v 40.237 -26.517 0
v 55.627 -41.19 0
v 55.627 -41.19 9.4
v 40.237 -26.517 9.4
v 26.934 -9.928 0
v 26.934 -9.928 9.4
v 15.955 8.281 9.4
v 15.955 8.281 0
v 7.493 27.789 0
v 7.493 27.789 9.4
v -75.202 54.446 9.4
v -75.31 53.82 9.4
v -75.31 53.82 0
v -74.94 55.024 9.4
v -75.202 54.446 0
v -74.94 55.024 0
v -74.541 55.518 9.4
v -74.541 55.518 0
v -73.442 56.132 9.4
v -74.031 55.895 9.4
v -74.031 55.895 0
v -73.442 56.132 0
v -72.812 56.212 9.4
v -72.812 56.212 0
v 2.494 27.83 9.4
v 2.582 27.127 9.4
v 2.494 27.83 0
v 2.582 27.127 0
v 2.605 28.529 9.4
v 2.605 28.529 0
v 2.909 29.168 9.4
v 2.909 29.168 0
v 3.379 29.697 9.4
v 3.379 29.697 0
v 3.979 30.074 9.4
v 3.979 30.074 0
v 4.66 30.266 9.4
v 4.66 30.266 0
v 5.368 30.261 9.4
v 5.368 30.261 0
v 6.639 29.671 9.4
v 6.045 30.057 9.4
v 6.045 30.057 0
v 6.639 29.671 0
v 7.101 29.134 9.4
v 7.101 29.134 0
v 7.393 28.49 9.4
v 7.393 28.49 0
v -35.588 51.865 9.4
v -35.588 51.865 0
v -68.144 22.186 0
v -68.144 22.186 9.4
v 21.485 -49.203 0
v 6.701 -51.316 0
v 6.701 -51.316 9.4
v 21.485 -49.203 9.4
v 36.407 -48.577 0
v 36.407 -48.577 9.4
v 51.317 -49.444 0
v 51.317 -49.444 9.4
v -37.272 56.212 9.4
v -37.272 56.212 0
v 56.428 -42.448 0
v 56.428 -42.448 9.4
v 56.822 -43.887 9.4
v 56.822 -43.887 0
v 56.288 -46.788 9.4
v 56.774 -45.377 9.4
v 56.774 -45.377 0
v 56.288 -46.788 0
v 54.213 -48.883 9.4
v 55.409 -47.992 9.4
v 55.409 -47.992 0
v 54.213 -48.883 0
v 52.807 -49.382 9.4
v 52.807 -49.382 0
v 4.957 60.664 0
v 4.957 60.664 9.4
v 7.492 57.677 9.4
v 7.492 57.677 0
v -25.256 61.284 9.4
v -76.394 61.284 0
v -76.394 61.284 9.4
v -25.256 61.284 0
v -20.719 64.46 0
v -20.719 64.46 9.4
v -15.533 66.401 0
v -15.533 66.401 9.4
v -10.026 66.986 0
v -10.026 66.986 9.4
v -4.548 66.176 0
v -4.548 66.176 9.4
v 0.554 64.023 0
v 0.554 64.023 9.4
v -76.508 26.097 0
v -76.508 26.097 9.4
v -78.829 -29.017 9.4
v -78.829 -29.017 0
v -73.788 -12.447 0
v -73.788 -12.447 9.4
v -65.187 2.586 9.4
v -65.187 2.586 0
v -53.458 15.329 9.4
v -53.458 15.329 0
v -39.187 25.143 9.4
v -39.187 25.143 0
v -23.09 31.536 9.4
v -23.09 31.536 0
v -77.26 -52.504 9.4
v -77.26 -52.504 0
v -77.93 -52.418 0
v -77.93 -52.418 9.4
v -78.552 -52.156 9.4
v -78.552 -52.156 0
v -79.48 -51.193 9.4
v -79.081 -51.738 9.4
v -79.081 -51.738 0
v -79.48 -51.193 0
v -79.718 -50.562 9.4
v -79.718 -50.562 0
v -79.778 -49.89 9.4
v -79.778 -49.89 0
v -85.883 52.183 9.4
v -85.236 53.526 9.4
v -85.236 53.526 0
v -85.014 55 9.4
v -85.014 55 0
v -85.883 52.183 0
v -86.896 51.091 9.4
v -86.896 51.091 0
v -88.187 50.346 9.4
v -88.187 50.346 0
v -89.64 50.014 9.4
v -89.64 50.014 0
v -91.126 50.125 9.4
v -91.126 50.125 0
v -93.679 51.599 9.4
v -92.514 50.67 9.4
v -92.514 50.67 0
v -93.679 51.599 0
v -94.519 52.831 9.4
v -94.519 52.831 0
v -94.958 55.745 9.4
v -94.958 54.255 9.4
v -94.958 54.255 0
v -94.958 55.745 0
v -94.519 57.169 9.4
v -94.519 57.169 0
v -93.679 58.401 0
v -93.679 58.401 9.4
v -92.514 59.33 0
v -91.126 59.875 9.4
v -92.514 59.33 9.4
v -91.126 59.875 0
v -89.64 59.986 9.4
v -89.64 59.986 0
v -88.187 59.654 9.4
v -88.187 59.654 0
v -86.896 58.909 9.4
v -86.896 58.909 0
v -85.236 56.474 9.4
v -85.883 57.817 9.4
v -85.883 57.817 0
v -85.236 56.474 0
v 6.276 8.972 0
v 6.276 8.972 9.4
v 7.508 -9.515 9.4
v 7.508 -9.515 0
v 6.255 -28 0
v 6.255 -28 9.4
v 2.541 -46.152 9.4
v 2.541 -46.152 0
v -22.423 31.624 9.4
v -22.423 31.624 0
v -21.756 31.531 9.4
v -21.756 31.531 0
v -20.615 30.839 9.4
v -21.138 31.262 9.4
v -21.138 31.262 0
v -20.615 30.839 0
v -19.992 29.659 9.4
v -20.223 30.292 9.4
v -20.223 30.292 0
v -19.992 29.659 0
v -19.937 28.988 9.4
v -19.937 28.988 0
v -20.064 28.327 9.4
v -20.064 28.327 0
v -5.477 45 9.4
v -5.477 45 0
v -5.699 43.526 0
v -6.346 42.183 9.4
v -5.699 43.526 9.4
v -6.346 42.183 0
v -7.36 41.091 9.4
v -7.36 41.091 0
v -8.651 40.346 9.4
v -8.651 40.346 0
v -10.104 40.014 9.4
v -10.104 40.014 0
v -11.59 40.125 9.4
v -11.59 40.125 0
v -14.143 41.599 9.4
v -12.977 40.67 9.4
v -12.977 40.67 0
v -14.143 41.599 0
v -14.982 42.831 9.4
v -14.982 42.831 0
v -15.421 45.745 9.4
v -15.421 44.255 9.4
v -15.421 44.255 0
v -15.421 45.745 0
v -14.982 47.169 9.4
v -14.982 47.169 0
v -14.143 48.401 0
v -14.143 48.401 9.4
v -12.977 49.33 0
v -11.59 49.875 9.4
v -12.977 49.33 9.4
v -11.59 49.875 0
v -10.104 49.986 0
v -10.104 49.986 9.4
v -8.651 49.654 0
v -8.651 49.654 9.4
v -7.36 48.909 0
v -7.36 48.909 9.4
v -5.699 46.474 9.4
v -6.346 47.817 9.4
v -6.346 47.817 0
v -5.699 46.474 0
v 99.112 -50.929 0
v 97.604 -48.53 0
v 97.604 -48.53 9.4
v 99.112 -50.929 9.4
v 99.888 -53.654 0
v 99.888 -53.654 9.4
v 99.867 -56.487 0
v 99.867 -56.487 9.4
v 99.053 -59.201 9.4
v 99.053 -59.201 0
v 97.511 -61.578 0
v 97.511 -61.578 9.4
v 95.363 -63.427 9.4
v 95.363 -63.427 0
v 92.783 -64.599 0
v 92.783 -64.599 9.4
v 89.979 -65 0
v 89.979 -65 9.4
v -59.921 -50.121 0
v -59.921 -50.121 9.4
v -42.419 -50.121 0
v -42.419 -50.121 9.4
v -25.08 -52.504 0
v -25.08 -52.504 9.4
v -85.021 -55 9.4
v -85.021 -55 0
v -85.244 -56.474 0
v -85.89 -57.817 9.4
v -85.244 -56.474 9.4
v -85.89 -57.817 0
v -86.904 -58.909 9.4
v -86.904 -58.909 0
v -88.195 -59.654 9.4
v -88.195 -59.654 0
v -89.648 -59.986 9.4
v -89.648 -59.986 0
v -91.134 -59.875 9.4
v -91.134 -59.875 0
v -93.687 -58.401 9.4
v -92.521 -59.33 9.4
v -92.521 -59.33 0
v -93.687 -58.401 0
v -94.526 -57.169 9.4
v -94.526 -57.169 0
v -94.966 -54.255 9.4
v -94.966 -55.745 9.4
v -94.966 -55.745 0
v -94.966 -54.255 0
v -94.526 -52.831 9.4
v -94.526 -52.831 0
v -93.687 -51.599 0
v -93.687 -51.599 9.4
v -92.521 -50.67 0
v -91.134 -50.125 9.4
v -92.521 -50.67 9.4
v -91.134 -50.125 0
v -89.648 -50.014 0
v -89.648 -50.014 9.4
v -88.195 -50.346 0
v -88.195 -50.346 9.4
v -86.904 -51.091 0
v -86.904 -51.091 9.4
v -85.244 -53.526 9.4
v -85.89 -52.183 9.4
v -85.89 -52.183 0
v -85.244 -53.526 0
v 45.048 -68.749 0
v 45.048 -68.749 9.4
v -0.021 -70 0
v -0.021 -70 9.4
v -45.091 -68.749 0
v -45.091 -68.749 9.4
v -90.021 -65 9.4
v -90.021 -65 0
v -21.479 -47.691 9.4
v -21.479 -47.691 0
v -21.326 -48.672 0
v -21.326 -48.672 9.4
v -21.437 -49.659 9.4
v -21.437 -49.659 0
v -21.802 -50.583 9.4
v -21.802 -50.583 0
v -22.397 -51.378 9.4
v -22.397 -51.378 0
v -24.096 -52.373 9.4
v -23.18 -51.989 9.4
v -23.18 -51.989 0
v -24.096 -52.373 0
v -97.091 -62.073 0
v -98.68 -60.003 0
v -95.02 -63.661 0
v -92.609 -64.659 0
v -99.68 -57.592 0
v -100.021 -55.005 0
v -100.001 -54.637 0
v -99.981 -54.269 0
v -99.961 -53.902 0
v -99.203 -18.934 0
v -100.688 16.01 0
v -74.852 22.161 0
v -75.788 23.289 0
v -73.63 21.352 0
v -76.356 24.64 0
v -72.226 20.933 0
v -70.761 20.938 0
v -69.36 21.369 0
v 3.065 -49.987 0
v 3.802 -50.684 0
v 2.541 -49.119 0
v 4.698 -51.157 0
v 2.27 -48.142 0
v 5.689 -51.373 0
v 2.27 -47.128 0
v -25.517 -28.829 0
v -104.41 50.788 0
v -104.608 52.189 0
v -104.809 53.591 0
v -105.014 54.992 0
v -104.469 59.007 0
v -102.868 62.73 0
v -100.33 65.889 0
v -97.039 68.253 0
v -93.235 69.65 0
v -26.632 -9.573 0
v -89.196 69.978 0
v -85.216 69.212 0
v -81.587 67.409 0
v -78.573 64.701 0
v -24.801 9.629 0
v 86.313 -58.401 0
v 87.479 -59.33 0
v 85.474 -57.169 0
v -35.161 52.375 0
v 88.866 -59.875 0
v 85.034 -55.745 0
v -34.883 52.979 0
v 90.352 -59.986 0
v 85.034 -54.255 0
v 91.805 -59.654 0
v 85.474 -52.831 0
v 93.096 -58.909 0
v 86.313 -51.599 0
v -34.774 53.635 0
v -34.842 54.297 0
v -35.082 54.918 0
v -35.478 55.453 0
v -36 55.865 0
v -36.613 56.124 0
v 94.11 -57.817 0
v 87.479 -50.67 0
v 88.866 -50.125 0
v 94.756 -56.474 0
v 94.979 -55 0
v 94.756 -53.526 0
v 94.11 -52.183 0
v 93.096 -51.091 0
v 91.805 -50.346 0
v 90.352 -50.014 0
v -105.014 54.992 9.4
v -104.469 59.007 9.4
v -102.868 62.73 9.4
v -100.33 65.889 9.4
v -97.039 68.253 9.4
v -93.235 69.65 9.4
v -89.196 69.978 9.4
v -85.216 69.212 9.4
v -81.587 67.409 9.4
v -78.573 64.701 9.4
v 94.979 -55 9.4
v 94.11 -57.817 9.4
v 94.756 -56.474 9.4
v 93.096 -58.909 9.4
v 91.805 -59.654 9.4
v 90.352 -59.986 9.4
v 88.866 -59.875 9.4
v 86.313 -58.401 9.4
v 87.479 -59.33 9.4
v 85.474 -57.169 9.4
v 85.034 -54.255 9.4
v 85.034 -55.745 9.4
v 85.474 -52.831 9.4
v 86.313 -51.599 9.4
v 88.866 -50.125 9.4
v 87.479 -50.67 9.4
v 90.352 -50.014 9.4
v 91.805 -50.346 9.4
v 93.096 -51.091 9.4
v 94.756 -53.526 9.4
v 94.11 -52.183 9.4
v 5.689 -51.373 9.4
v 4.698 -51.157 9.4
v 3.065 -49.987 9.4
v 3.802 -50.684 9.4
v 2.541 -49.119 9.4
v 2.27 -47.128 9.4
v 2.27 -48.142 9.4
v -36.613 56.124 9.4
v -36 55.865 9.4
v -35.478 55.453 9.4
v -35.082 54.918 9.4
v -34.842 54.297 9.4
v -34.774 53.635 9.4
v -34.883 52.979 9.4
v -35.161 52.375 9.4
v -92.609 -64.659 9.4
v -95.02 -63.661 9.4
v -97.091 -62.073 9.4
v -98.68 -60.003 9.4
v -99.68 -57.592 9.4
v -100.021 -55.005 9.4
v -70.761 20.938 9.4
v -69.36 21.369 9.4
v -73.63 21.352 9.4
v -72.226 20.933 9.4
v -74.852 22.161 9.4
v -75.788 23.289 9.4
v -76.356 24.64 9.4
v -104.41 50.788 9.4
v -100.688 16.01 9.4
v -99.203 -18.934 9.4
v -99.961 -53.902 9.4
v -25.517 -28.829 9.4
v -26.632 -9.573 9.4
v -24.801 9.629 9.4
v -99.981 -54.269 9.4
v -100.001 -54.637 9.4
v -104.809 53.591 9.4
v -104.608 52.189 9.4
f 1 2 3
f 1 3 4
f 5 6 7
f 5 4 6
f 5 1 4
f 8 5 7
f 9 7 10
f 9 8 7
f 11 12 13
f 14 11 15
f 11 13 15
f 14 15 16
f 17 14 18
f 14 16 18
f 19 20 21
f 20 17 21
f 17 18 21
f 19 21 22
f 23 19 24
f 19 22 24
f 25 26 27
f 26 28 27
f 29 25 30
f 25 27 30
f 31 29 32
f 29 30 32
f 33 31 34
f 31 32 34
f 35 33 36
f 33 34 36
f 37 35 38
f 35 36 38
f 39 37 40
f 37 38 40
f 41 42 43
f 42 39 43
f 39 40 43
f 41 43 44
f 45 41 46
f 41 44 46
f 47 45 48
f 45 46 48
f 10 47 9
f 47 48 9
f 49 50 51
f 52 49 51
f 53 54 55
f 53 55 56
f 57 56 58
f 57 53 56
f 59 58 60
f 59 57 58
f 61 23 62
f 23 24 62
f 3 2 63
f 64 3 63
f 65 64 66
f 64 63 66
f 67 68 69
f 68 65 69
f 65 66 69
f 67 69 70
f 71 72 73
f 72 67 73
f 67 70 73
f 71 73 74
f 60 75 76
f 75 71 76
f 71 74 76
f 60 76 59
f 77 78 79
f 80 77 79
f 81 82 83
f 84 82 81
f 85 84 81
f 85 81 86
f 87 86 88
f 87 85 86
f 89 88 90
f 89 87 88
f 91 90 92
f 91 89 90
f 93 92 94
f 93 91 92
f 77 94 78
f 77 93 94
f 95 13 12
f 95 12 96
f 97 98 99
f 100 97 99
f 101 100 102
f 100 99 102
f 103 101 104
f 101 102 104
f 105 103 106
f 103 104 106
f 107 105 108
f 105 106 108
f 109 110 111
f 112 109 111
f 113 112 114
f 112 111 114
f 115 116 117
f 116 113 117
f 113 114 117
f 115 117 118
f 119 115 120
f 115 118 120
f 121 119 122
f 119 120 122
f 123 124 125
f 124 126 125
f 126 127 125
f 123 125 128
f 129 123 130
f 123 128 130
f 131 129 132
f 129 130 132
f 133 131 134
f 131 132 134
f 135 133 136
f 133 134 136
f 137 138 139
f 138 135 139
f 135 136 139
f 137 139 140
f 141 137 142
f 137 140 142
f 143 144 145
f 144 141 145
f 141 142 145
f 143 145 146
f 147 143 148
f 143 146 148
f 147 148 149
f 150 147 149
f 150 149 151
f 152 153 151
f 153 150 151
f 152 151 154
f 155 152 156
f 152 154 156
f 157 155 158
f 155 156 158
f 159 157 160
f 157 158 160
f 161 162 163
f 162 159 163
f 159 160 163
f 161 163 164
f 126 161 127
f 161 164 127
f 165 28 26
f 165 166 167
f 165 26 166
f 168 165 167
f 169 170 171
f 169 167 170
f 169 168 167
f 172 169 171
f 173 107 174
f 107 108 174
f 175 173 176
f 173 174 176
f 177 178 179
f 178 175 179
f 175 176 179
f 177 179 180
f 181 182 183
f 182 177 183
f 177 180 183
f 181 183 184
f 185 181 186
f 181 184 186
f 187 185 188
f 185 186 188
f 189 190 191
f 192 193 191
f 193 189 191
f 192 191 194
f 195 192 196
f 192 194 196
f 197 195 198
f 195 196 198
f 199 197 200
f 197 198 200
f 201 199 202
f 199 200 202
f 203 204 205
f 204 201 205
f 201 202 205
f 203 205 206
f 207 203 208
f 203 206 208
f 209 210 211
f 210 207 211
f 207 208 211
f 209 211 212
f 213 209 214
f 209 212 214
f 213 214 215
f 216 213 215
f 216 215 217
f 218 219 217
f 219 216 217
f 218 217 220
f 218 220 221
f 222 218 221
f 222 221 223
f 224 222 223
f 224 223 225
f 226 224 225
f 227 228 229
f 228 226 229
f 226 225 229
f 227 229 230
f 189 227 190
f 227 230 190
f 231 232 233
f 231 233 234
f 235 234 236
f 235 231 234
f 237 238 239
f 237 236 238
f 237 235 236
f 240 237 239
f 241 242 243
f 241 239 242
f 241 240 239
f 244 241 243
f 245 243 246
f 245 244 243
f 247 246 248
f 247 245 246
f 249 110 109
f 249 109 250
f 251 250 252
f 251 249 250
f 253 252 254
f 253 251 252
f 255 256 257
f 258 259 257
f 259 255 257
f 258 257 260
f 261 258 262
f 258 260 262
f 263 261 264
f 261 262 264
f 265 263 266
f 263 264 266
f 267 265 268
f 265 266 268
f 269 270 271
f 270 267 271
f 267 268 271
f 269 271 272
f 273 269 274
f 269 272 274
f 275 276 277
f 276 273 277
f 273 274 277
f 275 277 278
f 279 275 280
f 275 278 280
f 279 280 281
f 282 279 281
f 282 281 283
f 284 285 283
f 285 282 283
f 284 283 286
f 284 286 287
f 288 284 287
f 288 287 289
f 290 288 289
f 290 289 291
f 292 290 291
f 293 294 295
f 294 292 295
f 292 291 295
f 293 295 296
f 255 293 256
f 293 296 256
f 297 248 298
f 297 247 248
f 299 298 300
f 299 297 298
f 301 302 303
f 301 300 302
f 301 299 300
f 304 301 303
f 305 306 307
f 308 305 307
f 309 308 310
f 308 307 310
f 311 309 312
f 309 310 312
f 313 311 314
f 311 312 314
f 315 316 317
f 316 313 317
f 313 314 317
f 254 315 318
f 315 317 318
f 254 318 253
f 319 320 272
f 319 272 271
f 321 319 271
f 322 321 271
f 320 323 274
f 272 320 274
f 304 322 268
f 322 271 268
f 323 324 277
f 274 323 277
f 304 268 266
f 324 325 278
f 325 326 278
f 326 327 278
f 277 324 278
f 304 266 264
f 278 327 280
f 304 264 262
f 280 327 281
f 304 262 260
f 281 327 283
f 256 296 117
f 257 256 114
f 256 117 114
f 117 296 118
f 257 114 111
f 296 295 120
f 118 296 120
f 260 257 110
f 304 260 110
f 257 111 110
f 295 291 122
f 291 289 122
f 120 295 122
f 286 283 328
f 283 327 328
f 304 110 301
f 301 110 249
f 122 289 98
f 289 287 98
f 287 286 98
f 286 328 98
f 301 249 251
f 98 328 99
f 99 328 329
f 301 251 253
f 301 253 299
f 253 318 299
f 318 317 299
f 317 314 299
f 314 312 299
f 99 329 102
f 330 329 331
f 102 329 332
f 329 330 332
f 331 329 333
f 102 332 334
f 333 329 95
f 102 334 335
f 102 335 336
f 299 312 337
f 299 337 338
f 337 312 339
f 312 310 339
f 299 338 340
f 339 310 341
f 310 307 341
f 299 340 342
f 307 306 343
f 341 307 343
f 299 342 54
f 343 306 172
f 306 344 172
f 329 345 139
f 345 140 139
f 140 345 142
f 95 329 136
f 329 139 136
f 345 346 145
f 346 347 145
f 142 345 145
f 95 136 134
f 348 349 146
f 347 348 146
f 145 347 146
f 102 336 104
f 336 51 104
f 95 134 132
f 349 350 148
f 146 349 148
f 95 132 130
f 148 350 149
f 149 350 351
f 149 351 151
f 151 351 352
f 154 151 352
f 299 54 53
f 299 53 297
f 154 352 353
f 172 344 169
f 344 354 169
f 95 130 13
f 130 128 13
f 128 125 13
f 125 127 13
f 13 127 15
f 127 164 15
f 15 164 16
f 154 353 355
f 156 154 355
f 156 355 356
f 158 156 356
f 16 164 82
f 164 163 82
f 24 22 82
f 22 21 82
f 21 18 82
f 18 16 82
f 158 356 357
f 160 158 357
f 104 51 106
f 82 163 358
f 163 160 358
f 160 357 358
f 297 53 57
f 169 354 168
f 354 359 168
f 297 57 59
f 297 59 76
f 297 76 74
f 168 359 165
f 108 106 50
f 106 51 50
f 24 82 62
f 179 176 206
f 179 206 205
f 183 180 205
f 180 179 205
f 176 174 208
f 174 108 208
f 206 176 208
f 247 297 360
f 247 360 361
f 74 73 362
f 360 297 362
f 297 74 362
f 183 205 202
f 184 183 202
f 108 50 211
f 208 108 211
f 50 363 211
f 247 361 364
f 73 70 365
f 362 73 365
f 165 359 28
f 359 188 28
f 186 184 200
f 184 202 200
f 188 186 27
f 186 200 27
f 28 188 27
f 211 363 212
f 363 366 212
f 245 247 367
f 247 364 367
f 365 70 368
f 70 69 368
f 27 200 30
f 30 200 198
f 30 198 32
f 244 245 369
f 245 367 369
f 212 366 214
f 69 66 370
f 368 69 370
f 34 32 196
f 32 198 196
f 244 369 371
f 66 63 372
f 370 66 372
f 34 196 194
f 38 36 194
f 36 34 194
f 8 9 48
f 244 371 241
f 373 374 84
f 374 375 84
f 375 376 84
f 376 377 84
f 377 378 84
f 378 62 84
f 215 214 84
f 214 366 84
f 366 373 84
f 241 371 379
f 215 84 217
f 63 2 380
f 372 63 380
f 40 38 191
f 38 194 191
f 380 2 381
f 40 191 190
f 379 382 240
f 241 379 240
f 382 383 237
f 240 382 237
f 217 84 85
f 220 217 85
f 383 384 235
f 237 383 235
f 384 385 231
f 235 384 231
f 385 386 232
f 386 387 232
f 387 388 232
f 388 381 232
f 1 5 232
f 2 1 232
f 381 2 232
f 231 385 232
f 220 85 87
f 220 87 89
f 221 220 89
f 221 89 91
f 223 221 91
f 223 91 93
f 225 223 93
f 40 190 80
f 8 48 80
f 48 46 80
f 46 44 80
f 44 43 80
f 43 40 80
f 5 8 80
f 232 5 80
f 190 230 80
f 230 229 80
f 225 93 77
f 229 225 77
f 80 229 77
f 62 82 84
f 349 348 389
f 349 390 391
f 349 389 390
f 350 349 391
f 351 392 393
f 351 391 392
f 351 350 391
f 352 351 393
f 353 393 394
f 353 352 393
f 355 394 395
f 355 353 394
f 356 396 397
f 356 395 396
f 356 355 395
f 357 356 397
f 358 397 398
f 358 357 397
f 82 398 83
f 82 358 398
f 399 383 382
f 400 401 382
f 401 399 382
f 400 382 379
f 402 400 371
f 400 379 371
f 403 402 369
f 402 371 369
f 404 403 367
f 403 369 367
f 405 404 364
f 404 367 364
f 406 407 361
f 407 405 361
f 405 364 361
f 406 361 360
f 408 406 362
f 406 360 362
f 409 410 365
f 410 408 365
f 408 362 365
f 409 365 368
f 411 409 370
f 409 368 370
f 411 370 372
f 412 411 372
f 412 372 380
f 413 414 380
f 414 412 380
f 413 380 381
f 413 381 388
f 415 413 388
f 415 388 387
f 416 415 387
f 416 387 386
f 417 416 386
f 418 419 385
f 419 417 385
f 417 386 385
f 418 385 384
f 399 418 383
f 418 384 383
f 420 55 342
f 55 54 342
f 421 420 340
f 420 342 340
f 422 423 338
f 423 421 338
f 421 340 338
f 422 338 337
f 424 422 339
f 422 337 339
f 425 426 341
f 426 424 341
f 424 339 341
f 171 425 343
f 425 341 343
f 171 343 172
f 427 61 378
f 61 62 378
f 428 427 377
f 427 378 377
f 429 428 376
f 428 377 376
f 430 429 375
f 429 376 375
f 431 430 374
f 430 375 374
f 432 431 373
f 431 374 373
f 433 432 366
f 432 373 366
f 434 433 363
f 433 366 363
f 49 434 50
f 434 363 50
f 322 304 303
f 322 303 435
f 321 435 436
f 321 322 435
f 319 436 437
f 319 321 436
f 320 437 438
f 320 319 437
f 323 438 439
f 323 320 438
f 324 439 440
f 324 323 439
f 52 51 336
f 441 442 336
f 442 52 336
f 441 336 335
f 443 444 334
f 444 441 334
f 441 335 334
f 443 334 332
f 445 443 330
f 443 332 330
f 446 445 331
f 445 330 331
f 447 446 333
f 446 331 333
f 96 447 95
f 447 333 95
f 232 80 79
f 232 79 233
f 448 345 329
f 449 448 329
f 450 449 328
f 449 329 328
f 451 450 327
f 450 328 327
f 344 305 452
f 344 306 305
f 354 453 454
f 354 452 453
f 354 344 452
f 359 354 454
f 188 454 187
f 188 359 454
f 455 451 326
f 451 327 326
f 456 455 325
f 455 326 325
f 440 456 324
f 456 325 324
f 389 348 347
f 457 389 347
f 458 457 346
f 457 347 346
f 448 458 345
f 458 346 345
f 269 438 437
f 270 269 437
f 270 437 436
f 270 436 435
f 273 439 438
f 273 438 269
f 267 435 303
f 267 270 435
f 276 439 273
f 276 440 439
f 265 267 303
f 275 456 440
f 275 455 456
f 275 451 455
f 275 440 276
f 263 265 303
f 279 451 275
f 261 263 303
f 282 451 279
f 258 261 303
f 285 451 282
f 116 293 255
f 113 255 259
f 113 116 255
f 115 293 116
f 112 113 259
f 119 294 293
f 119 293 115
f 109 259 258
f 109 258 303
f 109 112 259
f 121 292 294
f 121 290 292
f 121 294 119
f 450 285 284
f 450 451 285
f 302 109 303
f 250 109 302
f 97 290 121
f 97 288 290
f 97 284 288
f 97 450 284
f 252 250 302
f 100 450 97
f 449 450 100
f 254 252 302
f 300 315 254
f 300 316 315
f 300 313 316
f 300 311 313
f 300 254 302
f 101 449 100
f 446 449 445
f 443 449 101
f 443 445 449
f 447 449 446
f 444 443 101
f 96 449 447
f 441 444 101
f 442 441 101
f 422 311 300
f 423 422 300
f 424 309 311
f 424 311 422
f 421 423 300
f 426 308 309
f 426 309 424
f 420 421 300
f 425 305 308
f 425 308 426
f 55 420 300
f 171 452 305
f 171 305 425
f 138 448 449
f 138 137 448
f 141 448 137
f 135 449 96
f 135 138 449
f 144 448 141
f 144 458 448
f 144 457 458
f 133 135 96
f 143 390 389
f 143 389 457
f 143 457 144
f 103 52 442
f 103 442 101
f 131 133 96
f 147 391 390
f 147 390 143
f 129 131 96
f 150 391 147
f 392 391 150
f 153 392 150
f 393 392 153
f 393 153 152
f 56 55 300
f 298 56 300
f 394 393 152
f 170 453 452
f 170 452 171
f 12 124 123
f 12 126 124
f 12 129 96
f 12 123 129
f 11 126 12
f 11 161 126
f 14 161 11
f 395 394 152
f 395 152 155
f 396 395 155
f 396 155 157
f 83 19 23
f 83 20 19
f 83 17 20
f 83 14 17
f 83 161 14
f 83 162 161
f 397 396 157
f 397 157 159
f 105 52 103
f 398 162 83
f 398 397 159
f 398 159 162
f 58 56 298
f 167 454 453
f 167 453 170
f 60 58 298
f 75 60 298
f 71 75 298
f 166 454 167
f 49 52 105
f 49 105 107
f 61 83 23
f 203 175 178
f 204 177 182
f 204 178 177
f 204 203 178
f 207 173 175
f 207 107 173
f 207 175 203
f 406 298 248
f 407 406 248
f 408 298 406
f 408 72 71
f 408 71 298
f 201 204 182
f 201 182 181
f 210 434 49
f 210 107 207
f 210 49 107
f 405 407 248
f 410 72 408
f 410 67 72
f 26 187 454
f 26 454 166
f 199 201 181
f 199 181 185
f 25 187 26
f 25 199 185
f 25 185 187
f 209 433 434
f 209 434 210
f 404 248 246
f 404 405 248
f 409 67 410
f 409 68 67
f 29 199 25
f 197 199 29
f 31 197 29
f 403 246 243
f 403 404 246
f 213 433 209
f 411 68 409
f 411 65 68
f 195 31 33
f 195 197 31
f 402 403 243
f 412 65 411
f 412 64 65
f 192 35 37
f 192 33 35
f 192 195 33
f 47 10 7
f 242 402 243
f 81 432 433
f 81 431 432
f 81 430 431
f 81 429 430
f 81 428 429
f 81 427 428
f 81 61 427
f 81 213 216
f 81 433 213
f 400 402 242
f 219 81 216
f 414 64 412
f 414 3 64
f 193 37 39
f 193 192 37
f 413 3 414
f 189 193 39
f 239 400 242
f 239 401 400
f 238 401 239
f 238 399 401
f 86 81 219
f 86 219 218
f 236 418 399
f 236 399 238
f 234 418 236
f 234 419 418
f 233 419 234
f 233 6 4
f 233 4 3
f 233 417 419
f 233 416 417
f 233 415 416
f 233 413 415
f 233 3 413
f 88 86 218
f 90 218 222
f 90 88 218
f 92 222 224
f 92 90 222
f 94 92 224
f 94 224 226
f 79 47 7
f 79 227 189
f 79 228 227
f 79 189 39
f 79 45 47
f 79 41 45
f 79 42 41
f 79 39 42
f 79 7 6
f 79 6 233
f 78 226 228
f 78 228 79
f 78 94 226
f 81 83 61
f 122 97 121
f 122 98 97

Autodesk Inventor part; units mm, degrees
ref_plane "YZ Plane" through (0, 0, 0) normal (1, 0, 0) x (0, 1, 0)
ref_plane "XZ Plane" through (0, 0, 0) normal (0, 1, 0) x (-1, 0, 0)
ref_plane "XY Plane" through (0, 0, 0) normal (0, 0, 1) x (1, 0, 0)
sketch "Sketch1" plane through (0, 0, 0) normal (0, 0, 1) x (1, 0, 0)
  line L0 (-110, 70) -> (110, 70) construction
  line L1 (110, 70) -> (110, -70) construction
  line L2 (110, -70) -> (-110, -70) construction
  line L3 (-110, -70) -> (-110, 70) construction
  circle A0 centre (-90.0138, 55) radius 5
  circle A1 centre (-90.0214, -55) radius 5
  circle A2 centre (89.9786, -55) radius 5
  circle A3 centre (-10.4773, 45) radius 5
  line L4 (-67, 0) -> (-42, 0) construction
  line L5 (-42, 0) -> (-42, -30) construction
  line L6 (-42, -30) -> (-67, -30) construction
  line L7 (-67, -30) -> (-67, 0) construction
  circle A4 centre (-54.5, -19) radius 10 construction
  arc A5 (-76.3936, 61.2841) -> (-104.4102, 50.7876) centre (-90.0138, 55) ccw
  arc A6 (-99.9609, -53.9017) -> (-88.1312, -64.8197) centre (-90.0214, -55) ccw
  arc A7 (-100.0214, -55.005) -> (-105.0138, 54.9917) centre (-644.4166, -24.602) ccw
  line L8 (-35.5883, 51.8649) -> (-68.1439, 22.1865)
  line L9 (-75.3098, 53.8204) -> (-76.5077, 26.0974)
  line L10 (-78.8288, -29.0174) -> (-79.7785, -49.89)
  arc A8 (89.9786, -65) -> (97.6038, -48.5303) centre (89.9786, -55) ccw
  line L11 (4.9567, 60.6642) -> (97.6038, -48.5303)
  arc A9 (4.9567, 60.6642) -> (-25.2559, 61.2841) centre (-10.4773, 45) ccw
  arc A10 (-76.5077, 26.0974) -> (-68.1439, 22.1865) centre (-71.5124, 25.8816) ccw
  line L12 (-76.3936, 61.2841) -> (-25.2559, 61.2841)
  line L13 (-72.8121, 56.2124) -> (-37.2725, 56.2124)
  arc A11 (-72.8121, 56.2124) -> (-75.3098, 53.8204) centre (-72.8121, 53.7124) ccw
  arc A12 (-35.5883, 51.8649) -> (-37.2725, 56.2124) centre (-37.2725, 53.7124) ccw
  arc A13 (-20.0641, 28.3268) -> (-21.4793, -47.6907) centre (99.5505, -11.922) ccw
  circle A14 centre (-63.5274, -9.3914) radius 3 construction
  circle A15 centre (-57.919, -6.3914) radius 3 construction
  circle A16 centre (-51.0643, -6.3914) radius 3 construction
  circle A17 centre (-45.5038, -9.3914) radius 3 construction
  arc A18 (-23.0905, 31.5363) -> (-78.8288, -29.0174) centre (-2.761, -43.1063) ccw
  arc A19 (-20.0641, 28.3268) -> (-23.0905, 31.5363) centre (-22.4335, 29.1241) ccw
  arc A20 (-25.0801, -52.5035) -> (-21.4793, -47.6907) centre (-25.0756, -48.7535) ccw
  arc A21 (-79.7785, -49.89) -> (-77.2605, -52.5035) centre (-77.2811, -50.0036) ccw
  arc A22 (-90.0214, -65) -> (89.9786, -65) centre (-0.0214, 742.5) ccw
  arc A23 (-25.0801, -52.5035) -> (-77.2605, -52.5035) centre (-51.1703, -178.0833) ccw
  arc A24 (89.9786, -65) -> (97.6038, -48.5303) centre (89.9786, -55) ccw
  arc A25 (51.3169, -49.4442) -> (6.7008, -51.3162) centre (35.2009, -197.9611) ccw
  arc A26 (7.4915, 57.6767) -> (-25.2559, 61.2841) centre (-10.4773, 45) ccw
  arc A27 (2.5412, -46.1517) -> (6.7008, -51.3162) centre (5.9854, -47.6351) ccw
  arc A28 (51.3169, -49.4442) -> (55.6269, -41.1897) centre (51.8562, -44.4734) ccw
  arc A29 (2.5412, -46.1517) -> (2.5412, 27.2773) centre (-130.6751, -9.4372) ccw
  arc A30 (7.4934, 27.7888) -> (2.5825, 27.1273) centre (4.9934, 27.7888) ccw
  arc A31 (7.4934, 27.7888) -> (55.6269, -41.1897) centre (157.8186, 81.4032) ccw
  point P0 (0, 0)
  point P1 (-90.7944, -64.9701)
  point P2 (-90.0214, -65)
  dimension "d1" = 70
  dimension "d2" = 70
  dimension "d5" = 10
  dimension "d6" = 10
  dimension "d7" = 10
  dimension "d8" = 10
  dimension "d9" = 55
  dimension "d10" = 55
  dimension "d11" = 55
  dimension "d12" = 180
  dimension "d16" = 45
  dimension "d17" = 42
  dimension "d18" = 30
  dimension "d19" = 0
  dimension "d20" = 25
  dimension "d21" = 20
  dimension "d25" = 19
  dimension "d26" = 12.5
  dimension "d68" = 30
  dimension "d70" = 20
  dimension "d71" = 20
  dimension "d74" = 10
  dimension "d75" = 5
  dimension "d76" = 5
  dimension "d77" = 6
  dimension "d78" = 6
  dimension "d79" = 6
  dimension "d80" = 6
  dimension "d81" = 5
  dimension "d84" = 7.5
  dimension "d88" = 5
  dimension "d92" = 7.5
  dimension "d93" = 10
  dimension "d94" = 5
extrude "Extrusion9" add sketch "Sketch1" along normal blind 9.4 contours L12 A9 L11 A8 A22 A6 A7 A5
equation "\"d1\" = d2"
equation "\"d10\" = d9"
equation "\"d11\" = d9"
equation "\"d26\" = 0.5 * d20"
properties part number "Bracket Concept MK11"
